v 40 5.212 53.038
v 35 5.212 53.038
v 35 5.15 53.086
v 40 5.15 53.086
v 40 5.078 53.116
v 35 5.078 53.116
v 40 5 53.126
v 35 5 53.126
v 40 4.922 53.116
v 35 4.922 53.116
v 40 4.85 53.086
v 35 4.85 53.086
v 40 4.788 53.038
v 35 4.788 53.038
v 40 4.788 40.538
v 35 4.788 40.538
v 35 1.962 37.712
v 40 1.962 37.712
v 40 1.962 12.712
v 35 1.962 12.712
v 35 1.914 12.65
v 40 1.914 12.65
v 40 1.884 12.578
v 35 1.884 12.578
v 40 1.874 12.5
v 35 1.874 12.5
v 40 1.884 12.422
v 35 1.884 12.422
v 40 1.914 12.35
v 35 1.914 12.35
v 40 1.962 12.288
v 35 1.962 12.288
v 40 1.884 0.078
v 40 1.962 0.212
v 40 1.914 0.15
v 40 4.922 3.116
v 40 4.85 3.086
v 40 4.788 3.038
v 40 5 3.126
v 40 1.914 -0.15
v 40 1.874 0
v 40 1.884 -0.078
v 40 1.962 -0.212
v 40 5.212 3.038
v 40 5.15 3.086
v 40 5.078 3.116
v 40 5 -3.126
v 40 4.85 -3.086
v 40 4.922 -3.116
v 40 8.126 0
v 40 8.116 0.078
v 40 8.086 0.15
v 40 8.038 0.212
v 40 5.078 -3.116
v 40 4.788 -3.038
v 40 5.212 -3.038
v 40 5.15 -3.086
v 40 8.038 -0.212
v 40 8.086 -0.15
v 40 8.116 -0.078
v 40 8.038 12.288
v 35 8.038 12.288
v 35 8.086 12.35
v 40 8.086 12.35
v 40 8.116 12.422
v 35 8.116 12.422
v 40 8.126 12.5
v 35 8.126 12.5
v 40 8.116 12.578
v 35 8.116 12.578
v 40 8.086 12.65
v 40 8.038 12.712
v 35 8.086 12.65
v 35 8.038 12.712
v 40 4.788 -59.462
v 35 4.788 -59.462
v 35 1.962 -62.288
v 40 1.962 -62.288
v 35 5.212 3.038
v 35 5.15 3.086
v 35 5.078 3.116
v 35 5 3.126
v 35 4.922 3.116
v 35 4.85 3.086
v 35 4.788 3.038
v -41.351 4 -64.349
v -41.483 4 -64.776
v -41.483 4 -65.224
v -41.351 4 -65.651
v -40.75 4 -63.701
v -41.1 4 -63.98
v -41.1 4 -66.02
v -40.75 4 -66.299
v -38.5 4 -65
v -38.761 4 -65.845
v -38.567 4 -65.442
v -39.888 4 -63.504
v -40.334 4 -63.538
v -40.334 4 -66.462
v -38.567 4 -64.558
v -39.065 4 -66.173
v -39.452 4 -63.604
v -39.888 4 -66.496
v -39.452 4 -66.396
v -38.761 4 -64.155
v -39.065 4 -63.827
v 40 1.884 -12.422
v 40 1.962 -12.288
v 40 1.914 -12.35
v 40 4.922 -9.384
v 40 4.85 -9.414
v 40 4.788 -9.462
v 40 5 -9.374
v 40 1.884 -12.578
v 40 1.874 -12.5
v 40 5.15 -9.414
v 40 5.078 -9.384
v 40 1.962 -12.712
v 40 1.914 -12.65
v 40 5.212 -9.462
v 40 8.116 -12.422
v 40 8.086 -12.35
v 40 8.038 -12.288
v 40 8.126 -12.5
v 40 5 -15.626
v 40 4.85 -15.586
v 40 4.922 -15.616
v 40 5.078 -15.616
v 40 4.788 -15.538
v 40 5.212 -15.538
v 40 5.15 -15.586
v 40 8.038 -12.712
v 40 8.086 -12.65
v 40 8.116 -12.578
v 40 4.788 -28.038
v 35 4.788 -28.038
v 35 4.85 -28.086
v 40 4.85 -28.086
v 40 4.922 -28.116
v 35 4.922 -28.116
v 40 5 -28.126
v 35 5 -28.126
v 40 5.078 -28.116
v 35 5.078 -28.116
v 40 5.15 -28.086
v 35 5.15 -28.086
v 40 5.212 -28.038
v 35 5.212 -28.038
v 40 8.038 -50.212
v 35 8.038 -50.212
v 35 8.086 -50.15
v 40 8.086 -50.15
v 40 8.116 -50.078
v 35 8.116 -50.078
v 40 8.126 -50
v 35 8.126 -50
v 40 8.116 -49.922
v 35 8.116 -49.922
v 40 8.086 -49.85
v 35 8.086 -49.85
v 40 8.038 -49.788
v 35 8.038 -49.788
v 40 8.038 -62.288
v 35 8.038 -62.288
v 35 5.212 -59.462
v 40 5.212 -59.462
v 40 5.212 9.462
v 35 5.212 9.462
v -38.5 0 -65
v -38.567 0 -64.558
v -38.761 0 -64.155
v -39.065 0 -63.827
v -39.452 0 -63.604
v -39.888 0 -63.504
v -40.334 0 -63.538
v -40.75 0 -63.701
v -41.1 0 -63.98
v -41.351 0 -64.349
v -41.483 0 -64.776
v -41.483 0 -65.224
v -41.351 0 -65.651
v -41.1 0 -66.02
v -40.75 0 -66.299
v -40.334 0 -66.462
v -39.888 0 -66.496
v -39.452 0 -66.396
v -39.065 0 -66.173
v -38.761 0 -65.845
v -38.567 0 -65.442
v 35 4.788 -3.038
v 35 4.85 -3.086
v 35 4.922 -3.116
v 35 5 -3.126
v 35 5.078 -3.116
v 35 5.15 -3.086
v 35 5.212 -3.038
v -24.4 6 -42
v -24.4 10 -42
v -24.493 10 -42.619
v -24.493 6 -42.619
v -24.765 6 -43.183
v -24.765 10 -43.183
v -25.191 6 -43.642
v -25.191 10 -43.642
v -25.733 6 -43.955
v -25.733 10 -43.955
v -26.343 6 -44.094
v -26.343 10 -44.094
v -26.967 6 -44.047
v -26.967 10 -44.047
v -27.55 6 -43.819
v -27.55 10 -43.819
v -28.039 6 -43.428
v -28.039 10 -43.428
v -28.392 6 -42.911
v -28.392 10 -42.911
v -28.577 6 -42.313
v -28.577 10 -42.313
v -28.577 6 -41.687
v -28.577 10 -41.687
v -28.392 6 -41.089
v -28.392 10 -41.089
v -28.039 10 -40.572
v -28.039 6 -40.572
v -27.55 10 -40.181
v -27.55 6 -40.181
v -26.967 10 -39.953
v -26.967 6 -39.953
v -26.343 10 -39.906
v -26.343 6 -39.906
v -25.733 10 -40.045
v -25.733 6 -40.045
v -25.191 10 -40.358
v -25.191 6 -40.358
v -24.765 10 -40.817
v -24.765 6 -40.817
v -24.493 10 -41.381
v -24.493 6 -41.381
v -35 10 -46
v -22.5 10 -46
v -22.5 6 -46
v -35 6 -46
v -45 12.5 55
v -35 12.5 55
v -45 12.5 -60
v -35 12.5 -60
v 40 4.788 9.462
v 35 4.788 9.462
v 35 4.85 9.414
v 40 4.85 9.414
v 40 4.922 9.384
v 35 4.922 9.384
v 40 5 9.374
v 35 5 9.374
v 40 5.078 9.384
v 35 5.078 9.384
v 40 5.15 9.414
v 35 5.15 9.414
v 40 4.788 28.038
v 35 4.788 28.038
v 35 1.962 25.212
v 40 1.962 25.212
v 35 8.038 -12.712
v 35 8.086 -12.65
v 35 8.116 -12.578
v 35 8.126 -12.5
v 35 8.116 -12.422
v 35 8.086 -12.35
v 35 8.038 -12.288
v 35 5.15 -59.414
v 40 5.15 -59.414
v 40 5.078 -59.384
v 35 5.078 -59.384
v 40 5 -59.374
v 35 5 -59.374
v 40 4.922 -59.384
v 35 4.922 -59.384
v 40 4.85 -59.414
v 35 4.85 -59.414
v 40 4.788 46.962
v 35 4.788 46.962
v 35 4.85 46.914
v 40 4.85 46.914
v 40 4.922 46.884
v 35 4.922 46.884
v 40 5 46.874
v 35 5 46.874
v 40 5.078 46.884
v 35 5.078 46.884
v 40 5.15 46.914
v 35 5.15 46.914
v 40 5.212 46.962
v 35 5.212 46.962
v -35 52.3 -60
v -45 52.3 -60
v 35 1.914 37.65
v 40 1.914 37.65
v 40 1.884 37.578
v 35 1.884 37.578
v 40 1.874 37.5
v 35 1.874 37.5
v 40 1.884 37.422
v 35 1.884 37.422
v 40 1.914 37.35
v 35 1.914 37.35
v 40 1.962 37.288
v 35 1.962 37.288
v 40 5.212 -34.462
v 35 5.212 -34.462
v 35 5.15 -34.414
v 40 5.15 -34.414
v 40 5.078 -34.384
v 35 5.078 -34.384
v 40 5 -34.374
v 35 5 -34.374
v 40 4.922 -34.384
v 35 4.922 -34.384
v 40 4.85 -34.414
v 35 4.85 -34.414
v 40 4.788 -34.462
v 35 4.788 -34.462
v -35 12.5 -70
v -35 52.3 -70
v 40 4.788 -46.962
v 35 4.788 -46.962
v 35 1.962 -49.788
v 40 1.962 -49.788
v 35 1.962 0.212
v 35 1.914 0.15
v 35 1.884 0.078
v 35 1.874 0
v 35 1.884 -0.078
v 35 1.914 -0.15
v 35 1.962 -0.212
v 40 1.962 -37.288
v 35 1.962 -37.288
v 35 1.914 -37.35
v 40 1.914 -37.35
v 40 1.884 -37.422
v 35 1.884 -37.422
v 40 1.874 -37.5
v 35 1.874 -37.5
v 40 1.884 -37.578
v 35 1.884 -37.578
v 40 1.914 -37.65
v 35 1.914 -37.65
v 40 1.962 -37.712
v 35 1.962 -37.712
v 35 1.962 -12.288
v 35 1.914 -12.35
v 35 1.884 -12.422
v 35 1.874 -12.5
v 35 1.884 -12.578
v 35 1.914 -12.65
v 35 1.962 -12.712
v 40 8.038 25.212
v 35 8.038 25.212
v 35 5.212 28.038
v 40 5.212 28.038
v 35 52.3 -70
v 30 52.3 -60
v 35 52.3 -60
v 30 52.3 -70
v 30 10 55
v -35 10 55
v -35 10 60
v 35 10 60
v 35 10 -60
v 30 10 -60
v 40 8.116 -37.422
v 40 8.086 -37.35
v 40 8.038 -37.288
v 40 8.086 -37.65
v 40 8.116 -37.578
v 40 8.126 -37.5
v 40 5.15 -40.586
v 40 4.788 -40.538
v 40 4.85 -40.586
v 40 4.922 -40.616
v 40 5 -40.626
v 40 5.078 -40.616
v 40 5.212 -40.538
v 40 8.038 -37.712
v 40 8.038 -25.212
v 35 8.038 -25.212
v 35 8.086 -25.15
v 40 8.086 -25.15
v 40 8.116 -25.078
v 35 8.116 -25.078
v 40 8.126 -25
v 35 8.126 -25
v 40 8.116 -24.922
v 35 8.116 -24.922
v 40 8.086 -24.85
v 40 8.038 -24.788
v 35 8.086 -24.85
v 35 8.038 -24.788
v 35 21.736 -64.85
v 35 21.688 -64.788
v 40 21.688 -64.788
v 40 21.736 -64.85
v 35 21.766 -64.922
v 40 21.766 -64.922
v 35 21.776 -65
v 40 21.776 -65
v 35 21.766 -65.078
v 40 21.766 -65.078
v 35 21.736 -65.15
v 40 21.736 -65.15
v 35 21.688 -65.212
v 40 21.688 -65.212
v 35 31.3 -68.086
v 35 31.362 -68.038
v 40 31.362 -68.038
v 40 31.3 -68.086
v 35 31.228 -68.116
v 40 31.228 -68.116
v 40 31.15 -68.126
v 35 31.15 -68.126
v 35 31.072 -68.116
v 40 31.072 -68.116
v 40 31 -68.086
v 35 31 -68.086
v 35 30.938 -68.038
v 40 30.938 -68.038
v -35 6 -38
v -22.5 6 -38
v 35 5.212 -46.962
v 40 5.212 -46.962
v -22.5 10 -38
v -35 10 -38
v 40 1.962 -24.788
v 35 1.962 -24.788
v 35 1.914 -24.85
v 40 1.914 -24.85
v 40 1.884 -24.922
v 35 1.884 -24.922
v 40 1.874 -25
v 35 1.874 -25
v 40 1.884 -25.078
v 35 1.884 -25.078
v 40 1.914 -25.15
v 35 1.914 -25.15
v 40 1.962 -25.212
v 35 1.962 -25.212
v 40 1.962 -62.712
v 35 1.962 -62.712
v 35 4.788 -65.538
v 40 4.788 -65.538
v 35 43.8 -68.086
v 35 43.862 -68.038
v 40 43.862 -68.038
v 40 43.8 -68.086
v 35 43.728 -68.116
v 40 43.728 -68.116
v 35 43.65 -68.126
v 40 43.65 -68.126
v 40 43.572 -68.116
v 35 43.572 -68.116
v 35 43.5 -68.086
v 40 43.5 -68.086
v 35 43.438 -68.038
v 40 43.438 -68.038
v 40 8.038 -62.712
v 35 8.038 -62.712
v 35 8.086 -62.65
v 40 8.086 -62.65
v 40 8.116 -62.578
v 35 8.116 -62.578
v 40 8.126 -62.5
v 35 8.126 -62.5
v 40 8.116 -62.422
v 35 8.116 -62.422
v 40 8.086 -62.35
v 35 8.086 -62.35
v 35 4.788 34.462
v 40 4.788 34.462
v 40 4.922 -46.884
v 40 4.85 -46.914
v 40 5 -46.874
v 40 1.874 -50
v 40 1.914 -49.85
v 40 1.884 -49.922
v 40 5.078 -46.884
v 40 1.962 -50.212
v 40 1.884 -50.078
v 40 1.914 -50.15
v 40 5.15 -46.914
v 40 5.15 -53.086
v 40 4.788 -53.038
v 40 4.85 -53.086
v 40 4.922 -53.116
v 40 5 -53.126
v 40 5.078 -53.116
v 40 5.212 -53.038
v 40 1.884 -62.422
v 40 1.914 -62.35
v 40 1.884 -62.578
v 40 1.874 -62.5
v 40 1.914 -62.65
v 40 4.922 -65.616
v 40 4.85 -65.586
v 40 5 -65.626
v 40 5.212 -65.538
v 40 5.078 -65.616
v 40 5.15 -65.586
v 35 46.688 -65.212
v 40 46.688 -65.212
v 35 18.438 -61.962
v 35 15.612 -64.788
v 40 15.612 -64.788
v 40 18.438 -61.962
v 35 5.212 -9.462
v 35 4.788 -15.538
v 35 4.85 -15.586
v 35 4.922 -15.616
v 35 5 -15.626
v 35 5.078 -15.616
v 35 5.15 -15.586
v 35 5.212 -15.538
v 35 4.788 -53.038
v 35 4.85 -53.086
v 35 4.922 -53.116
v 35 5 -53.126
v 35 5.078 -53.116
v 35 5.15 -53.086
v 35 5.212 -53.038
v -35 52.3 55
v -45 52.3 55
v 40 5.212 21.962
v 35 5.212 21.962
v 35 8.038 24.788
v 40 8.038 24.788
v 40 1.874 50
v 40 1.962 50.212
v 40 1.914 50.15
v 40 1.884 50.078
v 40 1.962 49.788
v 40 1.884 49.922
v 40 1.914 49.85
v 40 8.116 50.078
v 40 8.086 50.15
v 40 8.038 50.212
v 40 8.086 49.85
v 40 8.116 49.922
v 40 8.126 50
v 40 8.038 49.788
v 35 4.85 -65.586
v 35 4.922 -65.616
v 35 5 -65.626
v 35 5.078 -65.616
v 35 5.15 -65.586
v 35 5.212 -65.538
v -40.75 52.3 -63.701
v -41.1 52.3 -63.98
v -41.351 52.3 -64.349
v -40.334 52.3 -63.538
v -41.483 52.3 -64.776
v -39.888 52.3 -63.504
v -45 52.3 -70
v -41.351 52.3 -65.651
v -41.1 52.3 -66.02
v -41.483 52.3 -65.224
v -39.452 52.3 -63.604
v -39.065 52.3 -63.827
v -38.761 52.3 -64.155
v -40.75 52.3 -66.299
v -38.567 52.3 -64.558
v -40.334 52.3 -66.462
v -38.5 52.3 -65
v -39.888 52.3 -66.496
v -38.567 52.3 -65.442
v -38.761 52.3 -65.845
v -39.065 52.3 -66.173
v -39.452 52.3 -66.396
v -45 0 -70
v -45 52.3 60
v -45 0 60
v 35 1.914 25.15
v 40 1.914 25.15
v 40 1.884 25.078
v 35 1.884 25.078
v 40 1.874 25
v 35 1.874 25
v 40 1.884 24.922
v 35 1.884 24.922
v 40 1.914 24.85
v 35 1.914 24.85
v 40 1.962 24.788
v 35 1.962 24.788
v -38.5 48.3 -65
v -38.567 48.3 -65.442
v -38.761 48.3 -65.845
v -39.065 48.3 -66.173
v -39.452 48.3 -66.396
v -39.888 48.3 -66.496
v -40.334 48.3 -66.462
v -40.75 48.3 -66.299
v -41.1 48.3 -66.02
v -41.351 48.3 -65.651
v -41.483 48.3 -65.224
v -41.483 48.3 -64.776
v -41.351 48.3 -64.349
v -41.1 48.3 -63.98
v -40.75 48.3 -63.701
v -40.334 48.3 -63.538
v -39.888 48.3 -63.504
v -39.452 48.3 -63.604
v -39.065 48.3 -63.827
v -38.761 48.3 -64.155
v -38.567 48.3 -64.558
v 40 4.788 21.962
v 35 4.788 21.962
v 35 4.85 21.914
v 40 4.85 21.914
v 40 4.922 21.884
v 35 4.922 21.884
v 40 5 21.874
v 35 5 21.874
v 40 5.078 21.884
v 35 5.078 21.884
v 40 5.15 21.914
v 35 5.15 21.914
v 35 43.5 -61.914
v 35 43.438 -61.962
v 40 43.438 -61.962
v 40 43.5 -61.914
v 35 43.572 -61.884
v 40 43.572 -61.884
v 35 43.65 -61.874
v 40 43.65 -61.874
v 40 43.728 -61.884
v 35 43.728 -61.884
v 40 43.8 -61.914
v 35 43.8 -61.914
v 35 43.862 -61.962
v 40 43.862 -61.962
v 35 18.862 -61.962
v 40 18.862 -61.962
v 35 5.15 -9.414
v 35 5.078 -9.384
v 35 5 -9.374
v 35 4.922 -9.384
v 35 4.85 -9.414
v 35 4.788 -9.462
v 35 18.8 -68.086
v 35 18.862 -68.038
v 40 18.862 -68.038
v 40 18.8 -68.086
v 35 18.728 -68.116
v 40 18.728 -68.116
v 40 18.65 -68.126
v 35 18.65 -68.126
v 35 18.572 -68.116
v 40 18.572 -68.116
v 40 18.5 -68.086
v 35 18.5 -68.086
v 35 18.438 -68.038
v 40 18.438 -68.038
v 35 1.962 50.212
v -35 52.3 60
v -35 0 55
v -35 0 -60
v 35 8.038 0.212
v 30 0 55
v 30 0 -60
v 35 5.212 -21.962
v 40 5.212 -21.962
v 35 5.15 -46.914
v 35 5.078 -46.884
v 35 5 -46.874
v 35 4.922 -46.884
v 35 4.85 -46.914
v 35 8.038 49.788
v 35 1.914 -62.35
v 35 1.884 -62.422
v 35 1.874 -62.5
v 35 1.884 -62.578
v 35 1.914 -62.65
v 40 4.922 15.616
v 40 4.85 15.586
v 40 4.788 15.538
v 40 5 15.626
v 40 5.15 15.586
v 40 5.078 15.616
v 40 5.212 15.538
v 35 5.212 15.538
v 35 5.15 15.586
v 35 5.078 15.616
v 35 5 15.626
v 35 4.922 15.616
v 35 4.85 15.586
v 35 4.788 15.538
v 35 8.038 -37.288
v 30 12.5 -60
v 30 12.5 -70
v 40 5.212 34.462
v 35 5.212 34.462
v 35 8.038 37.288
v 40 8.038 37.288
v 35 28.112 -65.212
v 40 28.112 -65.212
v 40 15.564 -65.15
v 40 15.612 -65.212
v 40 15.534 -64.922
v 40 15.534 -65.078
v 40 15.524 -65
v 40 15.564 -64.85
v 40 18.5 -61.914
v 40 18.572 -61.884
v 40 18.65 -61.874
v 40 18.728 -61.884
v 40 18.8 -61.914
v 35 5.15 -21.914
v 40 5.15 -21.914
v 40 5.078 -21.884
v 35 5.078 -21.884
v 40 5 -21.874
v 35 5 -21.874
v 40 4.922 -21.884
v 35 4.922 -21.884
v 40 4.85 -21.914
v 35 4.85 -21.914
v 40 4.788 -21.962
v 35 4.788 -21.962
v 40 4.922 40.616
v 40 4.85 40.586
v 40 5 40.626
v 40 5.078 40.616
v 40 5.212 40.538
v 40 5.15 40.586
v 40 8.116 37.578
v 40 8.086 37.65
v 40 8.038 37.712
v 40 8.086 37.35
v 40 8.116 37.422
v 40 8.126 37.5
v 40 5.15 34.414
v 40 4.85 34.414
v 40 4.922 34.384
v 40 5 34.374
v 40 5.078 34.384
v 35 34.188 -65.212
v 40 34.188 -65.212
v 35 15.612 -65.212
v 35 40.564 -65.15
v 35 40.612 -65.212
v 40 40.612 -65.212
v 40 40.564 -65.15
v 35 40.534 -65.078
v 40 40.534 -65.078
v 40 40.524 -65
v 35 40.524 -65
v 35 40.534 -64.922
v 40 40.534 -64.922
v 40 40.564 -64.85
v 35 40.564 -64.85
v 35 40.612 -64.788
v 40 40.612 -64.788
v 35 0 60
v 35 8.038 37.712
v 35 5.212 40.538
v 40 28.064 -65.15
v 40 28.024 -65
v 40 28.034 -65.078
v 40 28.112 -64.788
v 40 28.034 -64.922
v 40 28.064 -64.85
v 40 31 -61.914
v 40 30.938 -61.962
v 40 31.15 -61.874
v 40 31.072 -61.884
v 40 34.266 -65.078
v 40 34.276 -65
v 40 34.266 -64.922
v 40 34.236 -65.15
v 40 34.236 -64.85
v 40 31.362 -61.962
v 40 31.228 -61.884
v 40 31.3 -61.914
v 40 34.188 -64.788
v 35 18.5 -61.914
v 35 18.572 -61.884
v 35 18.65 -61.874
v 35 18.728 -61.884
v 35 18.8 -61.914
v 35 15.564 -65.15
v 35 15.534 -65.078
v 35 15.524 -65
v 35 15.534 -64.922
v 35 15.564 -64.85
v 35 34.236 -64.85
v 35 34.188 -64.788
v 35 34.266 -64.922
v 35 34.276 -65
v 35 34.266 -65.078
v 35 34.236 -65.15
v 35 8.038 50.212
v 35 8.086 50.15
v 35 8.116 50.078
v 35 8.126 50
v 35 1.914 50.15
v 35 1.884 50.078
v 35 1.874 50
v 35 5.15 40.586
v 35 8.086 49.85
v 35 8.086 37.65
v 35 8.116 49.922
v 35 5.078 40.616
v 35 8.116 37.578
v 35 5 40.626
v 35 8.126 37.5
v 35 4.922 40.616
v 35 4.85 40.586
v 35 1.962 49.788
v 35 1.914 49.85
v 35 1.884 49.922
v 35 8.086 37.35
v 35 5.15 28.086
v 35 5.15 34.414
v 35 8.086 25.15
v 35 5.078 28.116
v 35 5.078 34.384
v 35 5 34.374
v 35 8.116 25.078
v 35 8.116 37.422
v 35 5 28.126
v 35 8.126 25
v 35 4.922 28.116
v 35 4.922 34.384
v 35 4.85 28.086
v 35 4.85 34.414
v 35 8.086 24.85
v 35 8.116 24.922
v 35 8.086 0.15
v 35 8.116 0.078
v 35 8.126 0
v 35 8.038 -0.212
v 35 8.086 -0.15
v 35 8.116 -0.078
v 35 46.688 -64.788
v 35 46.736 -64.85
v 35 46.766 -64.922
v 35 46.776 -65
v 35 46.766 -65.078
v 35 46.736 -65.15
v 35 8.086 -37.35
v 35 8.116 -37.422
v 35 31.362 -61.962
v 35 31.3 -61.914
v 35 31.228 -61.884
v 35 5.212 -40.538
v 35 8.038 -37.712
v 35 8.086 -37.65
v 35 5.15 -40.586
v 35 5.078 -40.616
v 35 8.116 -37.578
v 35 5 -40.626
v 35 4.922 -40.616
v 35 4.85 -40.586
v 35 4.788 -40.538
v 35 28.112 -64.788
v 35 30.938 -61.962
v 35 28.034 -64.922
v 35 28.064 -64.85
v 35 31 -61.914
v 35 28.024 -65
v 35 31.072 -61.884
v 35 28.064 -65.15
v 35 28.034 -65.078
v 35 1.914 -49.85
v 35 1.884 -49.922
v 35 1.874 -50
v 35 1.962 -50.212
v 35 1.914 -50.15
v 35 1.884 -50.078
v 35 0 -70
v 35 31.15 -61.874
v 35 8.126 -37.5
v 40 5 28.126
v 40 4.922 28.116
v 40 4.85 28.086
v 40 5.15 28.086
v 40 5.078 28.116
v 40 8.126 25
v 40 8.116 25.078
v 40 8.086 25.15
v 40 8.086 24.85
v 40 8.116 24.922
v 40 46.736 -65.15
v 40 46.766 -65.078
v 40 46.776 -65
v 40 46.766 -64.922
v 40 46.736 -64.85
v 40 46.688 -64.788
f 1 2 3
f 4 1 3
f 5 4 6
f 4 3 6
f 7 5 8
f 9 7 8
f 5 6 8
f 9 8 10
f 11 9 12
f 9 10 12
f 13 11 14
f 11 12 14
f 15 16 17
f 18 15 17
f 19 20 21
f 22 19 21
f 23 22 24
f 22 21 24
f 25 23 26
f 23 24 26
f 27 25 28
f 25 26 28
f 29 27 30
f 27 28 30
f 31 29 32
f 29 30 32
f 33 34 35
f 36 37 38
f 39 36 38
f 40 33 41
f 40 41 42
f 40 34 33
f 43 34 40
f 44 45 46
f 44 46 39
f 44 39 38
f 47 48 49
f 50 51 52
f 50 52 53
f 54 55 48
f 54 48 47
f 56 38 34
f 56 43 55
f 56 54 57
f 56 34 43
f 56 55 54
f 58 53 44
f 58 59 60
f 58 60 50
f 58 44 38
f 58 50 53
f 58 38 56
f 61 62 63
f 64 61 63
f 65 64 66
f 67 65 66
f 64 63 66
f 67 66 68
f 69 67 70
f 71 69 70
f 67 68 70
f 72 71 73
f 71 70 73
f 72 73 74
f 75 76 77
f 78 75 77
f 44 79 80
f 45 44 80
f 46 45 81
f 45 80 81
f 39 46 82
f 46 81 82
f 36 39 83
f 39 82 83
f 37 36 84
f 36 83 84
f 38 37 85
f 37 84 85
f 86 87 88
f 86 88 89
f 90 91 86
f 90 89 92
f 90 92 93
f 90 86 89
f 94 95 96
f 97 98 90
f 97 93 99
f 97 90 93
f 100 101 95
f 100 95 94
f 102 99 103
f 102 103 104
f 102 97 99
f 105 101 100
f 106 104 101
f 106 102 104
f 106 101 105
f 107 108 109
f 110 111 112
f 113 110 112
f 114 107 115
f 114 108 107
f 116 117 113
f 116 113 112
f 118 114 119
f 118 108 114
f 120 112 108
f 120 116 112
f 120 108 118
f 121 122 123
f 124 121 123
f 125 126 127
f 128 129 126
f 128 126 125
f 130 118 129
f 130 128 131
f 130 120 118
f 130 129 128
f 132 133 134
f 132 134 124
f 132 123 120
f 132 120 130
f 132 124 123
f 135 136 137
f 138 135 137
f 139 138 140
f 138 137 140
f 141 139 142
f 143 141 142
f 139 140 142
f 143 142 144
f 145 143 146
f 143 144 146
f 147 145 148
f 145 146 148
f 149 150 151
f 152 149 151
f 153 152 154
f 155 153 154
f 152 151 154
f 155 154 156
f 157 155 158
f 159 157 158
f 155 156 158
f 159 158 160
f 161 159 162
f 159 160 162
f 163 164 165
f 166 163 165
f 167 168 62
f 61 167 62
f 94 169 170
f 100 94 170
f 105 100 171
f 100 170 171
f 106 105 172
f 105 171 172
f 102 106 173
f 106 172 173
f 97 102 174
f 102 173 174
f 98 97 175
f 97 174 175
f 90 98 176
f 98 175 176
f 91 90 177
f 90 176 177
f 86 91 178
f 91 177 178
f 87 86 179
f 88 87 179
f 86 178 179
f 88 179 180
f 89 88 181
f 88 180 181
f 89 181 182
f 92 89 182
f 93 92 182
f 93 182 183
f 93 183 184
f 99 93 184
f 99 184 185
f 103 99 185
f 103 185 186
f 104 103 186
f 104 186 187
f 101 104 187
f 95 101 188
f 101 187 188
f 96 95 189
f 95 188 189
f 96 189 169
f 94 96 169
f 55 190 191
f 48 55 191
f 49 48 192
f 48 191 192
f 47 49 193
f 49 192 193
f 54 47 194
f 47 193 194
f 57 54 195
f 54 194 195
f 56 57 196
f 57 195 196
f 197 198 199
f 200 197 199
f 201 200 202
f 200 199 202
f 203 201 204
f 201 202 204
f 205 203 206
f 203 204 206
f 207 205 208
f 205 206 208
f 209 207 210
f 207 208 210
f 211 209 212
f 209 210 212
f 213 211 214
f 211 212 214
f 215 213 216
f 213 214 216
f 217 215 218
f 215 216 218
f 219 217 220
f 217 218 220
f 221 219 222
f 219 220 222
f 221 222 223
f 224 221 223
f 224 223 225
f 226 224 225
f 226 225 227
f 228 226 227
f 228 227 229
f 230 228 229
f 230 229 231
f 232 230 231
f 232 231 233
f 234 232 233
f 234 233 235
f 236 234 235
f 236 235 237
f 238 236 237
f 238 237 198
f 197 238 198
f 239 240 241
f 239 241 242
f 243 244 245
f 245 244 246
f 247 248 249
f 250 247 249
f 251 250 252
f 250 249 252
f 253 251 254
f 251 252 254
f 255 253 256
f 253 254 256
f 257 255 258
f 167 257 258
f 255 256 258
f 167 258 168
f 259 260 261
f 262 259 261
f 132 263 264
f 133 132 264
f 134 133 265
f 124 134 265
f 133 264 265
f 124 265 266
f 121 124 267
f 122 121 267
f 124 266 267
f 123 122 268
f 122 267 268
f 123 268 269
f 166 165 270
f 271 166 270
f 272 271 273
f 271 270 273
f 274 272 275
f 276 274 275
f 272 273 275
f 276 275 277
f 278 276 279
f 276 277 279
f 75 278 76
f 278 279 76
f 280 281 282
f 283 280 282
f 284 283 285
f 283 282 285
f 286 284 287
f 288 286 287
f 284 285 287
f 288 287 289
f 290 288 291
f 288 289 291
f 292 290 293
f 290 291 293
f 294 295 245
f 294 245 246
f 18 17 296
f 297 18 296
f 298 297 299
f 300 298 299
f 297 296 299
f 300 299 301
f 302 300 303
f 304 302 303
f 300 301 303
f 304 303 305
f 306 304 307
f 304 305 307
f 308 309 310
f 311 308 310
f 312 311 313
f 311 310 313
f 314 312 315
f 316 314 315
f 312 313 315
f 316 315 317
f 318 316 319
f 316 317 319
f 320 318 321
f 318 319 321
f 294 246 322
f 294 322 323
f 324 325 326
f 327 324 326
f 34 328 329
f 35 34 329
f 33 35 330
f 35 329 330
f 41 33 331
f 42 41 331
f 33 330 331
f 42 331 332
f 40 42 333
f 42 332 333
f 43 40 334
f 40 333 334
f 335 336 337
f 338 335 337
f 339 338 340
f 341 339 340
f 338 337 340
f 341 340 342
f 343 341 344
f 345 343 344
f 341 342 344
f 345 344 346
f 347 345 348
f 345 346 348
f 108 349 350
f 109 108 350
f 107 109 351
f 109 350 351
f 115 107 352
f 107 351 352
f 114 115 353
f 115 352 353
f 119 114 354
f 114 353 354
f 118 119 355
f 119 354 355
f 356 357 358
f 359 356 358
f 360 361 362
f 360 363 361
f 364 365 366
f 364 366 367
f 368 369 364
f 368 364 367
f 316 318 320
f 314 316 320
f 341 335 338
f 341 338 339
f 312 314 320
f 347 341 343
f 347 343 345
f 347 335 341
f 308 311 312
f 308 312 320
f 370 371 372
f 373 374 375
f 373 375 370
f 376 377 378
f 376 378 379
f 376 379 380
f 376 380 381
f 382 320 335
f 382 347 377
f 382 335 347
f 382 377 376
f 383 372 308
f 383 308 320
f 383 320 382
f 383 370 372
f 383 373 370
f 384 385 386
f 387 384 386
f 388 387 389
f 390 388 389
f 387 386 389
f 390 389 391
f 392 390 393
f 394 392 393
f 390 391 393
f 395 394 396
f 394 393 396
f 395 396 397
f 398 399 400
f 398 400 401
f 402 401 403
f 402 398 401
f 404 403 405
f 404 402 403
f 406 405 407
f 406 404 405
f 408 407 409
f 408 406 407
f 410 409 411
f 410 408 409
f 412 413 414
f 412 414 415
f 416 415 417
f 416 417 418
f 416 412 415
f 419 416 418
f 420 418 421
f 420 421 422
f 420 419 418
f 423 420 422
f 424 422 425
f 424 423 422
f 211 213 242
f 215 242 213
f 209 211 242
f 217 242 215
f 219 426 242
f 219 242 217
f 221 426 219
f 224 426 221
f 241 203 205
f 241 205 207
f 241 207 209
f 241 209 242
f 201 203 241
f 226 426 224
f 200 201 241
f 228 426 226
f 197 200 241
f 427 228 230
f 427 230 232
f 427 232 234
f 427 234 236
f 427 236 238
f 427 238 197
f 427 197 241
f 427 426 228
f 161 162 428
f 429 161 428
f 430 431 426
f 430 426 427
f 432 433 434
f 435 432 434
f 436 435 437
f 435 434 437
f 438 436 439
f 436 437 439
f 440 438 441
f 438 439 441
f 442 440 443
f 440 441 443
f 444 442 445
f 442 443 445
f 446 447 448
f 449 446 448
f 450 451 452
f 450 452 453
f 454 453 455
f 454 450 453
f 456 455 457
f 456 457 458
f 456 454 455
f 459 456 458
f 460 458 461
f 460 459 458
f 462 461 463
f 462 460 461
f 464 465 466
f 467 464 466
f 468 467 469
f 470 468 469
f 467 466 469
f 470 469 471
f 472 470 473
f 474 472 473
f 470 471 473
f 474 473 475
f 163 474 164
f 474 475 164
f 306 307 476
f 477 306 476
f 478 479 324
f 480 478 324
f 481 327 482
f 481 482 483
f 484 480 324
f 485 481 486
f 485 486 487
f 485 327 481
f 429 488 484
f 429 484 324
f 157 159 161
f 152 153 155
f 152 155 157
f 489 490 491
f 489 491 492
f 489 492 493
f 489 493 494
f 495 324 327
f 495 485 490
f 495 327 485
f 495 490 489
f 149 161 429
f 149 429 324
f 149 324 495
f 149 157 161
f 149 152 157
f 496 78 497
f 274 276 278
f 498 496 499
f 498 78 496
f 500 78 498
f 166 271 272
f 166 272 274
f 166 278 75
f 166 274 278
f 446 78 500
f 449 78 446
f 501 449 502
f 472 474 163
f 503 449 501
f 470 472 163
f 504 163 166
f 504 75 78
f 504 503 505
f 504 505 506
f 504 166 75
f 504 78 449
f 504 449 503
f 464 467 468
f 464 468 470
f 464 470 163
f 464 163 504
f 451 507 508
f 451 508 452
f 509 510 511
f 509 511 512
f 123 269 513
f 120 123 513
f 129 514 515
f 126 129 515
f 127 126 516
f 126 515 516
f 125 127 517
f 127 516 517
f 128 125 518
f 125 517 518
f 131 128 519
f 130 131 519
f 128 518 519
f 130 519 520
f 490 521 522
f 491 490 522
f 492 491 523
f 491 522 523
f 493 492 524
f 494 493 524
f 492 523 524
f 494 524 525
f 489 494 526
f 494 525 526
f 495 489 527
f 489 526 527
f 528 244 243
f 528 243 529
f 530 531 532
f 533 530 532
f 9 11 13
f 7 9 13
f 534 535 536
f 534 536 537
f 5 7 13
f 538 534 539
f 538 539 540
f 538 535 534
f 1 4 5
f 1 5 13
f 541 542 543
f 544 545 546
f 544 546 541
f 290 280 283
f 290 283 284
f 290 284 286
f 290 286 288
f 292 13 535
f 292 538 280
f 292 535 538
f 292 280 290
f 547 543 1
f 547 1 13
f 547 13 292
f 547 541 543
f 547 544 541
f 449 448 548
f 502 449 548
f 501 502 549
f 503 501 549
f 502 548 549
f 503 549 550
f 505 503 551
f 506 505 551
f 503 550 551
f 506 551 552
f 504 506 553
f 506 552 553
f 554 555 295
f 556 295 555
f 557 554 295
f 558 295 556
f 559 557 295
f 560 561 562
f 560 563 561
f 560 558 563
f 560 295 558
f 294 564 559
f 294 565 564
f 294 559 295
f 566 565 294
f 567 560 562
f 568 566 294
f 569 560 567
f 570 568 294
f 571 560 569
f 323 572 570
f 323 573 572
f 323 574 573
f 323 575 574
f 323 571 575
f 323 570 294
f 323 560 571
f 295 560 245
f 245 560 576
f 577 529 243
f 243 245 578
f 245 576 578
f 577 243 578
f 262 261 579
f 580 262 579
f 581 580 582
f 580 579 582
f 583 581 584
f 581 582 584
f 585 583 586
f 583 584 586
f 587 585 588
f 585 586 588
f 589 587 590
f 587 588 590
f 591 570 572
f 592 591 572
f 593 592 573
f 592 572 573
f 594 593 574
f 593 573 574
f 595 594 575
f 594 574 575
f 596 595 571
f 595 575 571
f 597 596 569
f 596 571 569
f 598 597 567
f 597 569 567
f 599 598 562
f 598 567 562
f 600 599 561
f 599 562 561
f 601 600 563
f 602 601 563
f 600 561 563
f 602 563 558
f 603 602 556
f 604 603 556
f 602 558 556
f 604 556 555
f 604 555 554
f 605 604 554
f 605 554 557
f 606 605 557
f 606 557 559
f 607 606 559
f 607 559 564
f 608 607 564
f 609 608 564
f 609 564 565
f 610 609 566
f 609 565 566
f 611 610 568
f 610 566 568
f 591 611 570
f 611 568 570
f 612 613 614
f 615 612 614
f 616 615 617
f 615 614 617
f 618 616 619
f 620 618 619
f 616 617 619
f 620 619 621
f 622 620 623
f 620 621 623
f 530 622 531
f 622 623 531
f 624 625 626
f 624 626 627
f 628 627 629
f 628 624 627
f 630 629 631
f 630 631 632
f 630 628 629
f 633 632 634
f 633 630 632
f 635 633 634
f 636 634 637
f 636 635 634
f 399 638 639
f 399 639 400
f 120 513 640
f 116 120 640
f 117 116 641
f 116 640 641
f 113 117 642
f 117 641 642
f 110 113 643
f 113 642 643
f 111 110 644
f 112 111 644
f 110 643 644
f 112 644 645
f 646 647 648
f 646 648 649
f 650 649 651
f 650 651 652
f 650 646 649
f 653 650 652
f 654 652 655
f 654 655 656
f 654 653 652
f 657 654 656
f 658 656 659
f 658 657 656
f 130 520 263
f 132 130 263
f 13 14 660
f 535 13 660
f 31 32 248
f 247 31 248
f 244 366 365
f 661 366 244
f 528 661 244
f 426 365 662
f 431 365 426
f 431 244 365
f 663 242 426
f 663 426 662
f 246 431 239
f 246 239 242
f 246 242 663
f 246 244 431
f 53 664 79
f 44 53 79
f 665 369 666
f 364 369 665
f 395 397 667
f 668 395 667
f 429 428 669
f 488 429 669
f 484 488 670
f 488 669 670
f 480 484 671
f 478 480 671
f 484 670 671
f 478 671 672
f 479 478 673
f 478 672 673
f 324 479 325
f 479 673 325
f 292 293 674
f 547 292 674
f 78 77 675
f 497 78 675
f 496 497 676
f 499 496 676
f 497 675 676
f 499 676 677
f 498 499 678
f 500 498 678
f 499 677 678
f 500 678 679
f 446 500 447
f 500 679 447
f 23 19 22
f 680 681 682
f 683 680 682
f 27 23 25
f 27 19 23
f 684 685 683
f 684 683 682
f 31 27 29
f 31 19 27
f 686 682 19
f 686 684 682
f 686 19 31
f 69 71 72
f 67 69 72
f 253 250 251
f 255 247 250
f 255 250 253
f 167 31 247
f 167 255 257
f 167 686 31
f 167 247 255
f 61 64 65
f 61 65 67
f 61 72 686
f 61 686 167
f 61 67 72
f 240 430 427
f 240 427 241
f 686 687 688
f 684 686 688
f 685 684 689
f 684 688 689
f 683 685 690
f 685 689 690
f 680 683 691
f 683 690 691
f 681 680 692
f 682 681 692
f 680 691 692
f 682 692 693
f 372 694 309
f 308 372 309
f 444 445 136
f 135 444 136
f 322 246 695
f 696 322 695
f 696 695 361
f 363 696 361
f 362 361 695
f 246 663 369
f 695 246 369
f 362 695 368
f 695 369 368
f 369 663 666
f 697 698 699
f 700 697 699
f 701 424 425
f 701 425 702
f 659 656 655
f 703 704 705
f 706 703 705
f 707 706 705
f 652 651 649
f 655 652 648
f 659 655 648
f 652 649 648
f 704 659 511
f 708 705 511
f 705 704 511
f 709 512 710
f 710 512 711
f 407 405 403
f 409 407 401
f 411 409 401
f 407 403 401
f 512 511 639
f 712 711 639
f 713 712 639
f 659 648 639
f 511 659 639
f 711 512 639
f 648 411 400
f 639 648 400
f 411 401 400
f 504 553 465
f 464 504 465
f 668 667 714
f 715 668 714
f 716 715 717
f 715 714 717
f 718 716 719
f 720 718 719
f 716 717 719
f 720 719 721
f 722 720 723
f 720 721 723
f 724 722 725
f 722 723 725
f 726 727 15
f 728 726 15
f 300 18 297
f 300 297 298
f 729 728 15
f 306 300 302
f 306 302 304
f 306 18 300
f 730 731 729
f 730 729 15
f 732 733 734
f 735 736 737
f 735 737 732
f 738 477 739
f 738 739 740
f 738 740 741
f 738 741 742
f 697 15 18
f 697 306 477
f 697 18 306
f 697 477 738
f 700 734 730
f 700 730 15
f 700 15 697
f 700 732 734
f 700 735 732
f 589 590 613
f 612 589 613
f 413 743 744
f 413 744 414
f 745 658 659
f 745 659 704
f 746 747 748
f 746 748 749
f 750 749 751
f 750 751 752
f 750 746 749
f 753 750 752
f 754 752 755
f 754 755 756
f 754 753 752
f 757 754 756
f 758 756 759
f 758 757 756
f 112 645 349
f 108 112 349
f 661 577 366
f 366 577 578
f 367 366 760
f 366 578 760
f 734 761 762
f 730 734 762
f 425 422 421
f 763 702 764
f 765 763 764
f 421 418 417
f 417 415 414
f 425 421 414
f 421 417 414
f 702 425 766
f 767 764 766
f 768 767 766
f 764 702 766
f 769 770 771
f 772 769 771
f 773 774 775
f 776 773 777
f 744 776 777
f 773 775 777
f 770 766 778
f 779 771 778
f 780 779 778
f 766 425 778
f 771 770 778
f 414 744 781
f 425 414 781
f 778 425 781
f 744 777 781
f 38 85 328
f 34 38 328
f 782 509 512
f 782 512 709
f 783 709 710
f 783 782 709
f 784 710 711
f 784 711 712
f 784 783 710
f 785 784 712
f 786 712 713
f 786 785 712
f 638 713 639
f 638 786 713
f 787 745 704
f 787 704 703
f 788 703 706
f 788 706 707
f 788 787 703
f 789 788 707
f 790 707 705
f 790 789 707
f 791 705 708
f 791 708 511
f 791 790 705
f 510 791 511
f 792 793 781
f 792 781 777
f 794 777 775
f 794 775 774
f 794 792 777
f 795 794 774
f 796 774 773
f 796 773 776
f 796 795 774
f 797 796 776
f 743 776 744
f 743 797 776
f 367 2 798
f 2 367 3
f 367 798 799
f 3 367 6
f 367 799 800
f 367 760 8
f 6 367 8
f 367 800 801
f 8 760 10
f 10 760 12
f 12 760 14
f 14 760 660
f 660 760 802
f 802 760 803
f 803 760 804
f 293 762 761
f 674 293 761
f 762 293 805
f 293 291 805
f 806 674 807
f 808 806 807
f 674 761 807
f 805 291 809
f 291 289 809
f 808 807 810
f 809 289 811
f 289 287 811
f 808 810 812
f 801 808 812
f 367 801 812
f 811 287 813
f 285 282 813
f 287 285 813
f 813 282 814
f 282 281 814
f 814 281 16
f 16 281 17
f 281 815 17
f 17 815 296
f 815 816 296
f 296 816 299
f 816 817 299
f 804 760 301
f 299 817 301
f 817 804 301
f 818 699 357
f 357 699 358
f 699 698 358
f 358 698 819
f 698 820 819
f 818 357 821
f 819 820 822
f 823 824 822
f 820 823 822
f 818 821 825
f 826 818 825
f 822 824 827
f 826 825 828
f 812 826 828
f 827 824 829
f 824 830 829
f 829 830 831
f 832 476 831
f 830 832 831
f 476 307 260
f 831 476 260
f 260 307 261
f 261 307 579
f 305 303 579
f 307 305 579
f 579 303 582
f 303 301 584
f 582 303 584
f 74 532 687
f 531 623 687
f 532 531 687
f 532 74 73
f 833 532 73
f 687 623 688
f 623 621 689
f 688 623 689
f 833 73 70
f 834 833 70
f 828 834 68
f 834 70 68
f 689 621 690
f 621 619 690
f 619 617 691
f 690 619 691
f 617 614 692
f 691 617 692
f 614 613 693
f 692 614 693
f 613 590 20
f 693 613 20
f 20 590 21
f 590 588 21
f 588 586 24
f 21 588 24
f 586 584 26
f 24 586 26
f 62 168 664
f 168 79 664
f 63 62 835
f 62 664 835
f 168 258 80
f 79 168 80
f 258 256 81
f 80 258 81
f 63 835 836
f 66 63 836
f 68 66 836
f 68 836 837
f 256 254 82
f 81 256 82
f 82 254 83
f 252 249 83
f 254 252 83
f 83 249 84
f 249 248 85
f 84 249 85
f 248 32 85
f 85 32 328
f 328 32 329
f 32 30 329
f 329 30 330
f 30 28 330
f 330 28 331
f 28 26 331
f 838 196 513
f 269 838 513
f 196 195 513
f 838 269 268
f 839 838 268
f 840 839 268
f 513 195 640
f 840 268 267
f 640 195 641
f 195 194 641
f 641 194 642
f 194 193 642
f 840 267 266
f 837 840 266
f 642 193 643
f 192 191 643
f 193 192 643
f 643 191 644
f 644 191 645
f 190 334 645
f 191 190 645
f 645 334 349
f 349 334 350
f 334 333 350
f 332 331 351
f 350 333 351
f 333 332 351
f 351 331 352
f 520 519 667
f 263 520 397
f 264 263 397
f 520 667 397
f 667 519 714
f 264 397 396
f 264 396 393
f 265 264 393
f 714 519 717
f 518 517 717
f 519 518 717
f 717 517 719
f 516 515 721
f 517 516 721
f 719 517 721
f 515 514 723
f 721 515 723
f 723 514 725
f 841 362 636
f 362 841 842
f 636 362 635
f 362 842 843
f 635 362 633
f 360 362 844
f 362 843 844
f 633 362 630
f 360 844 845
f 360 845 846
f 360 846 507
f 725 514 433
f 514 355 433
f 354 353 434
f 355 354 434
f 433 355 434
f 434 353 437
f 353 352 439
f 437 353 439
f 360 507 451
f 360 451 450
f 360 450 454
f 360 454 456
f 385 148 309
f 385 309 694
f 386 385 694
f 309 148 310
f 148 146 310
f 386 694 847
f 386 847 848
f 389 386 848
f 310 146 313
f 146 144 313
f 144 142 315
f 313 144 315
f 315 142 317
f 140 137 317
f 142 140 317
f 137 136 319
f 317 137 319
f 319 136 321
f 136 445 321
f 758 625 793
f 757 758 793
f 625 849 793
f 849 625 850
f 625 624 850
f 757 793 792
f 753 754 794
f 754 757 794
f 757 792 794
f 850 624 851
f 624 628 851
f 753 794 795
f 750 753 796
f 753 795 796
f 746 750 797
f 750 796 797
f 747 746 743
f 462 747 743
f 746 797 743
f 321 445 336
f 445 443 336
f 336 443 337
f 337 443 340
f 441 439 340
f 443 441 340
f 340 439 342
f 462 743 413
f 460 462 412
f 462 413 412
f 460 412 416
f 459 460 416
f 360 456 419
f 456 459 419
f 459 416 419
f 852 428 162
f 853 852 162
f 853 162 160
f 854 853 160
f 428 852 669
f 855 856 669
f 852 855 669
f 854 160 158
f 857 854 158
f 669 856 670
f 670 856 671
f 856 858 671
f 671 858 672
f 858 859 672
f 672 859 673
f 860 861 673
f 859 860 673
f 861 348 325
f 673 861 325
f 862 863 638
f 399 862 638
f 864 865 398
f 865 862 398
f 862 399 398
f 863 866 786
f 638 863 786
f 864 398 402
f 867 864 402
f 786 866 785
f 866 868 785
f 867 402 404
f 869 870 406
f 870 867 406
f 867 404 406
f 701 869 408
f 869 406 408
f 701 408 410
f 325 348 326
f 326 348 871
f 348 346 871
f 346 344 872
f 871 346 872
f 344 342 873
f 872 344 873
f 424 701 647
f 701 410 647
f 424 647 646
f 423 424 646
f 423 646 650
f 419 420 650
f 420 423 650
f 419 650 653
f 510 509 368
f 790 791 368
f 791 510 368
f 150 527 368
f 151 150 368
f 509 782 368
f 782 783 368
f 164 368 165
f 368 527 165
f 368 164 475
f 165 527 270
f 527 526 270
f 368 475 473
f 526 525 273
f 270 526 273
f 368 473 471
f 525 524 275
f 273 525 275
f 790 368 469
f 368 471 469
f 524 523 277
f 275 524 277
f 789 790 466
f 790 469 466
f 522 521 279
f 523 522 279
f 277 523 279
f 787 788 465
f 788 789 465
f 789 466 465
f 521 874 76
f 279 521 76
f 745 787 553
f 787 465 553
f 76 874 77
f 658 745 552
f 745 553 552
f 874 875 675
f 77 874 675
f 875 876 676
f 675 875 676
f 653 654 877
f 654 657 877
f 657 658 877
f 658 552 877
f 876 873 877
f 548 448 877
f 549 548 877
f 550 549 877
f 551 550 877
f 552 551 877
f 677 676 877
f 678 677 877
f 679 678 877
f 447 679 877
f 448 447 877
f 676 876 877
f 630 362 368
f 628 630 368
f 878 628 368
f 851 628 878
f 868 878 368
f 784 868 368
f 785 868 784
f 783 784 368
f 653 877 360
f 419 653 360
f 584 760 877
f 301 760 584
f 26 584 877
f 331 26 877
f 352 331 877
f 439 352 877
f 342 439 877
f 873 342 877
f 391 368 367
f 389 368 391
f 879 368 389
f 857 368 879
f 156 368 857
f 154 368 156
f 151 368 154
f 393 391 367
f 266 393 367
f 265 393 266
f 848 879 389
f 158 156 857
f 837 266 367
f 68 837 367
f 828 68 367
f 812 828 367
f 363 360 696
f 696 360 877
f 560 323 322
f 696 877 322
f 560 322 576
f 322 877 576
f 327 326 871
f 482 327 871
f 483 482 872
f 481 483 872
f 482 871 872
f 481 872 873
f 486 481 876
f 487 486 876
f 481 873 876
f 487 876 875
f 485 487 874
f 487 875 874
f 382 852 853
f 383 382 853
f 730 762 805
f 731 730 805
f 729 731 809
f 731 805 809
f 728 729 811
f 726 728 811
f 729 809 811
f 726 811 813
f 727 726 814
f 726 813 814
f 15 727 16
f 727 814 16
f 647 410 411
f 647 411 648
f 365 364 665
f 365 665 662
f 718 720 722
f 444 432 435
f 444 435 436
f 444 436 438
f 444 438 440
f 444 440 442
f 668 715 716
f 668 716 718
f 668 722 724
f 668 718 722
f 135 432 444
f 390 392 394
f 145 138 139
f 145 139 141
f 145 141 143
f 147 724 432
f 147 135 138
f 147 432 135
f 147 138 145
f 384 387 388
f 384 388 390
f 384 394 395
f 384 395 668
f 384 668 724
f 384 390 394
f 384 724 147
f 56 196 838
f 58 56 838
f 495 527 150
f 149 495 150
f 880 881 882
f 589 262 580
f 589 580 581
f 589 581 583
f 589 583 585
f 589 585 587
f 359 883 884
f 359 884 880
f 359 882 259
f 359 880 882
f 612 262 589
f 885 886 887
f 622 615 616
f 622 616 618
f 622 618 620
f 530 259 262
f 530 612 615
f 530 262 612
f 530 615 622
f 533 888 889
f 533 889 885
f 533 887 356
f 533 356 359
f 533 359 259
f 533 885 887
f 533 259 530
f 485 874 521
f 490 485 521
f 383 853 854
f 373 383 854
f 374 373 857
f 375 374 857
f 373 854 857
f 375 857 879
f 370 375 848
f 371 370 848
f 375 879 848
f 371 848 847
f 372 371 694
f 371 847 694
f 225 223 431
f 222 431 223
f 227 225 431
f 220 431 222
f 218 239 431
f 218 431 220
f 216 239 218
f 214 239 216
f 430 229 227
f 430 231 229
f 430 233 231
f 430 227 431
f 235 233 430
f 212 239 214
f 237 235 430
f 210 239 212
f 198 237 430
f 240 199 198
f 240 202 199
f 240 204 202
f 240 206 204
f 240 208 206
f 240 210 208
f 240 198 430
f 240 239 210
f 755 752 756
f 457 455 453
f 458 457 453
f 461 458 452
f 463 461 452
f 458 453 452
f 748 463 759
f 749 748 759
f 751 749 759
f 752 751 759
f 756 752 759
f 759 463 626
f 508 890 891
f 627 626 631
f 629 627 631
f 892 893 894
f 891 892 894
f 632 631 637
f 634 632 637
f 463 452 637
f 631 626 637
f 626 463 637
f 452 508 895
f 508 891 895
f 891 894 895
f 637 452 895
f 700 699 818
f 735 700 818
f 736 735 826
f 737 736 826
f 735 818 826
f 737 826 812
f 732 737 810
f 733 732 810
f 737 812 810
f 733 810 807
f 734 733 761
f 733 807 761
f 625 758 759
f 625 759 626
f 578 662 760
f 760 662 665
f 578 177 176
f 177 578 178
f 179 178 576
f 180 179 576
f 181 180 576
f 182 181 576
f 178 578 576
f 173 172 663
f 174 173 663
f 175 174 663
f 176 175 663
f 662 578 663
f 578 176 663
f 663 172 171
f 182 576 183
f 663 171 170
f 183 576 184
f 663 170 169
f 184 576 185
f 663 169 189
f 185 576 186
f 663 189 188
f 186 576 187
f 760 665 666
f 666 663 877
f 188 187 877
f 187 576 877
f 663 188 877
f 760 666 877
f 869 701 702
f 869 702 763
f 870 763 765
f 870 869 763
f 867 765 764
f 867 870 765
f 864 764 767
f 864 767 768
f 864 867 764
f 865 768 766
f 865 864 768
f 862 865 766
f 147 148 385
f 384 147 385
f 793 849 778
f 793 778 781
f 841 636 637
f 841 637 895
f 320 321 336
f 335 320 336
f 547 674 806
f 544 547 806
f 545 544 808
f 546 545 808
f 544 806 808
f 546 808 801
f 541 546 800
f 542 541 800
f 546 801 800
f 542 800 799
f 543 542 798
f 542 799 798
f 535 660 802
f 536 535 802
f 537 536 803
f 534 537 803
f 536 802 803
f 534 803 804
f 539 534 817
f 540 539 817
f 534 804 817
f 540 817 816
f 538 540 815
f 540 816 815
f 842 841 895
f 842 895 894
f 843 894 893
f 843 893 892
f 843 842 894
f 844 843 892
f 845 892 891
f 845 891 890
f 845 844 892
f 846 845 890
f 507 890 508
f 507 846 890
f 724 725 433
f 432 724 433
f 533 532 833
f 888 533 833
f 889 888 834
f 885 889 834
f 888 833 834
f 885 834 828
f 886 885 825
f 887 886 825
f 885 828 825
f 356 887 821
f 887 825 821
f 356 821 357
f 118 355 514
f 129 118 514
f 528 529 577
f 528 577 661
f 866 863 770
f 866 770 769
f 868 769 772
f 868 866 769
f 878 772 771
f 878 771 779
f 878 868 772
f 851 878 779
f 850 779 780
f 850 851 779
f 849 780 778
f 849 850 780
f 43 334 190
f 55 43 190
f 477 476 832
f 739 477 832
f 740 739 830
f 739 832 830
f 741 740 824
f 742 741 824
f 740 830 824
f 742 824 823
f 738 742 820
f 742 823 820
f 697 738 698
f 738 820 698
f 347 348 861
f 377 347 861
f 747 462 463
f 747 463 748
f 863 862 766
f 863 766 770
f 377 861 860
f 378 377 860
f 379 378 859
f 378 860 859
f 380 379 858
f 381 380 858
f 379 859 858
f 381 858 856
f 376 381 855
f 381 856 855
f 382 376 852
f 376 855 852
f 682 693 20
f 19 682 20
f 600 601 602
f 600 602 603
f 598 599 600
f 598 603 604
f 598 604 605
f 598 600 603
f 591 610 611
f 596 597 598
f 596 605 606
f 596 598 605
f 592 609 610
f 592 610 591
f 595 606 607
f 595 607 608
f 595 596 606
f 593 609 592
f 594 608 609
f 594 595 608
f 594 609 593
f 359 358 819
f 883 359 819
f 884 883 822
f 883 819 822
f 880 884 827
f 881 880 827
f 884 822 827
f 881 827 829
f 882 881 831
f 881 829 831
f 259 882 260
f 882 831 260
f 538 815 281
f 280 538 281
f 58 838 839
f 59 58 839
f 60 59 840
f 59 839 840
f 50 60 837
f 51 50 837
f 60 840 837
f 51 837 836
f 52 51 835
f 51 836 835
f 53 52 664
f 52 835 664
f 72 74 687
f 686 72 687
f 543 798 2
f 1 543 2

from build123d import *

# Parameters (mm, degrees)
SKETCH1_W            = 80
SKETCH1_H            = 130
BOSS_EXTRUDE1_DEPTH  = 10
BOSS_EXTRUDE10_DEPTH = 42.3
SKETCH13_W           = 115
SKETCH13_H           = 39.8
CUT_EXTRUDE3_DEPTH   = 11
SKETCH14_W           = 65
SKETCH14_H           = 39.8
CUT_EXTRUDE4_DEPTH   = 11
SKETCH15_R           = 1.5
CUT_EXTRUDE5_DEPTH   = 4
SKETCH21_R           = 2.1
CUT_EXTRUDE8_DEPTH   = 11
BOSS_EXTRUDE11_DEPTH = 5
CUT_EXTRUDE9_DEPTH   = 11
SKETCH24_R           = 1.5
CUT_EXTRUDE10_DEPTH  = 4
SKETCH25_W           = 12.5
SKETCH25_H           = 8
CUT_EXTRUDE11_DEPTH  = 6


with BuildPart() as part:
    # Sketch1 → Boss-Extrude1 (new body)
    with BuildSketch(Plane(origin=(0, 0, 0), x_dir=(1, 0, 0), z_dir=(0, 1, 0))):
        with Locations((-5, 5)):
            Rectangle(SKETCH1_W, SKETCH1_H)
    extrude(amount=BOSS_EXTRUDE1_DEPTH)

    # Sketch9 → Boss-Extrude10 (add)
    with BuildSketch(Plane(origin=(0, 10, 0), x_dir=(1, 0, 0), z_dir=(0, 1, 0))):
        Polygon((35, 70), (-45, 70), (-45, -60), (-35, -60), (-35, 60), (35, 60), align=None)
    extrude(amount=BOSS_EXTRUDE10_DEPTH)

    # Sketch13 → Cut-Extrude3 (cut, through all)
    with BuildSketch(Plane(origin=(-35, 0, 0), x_dir=(0, 0, -1), z_dir=(1, 0, 0))):
        with Locations((2.5, 32.4)):
            Rectangle(SKETCH13_W, SKETCH13_H)
    extrude(amount=-CUT_EXTRUDE3_DEPTH, mode=Mode.SUBTRACT)

    # Sketch14 → Cut-Extrude4 (cut, through all)
    with BuildSketch(Plane.XY.offset(-60)):
        with Locations((-2.5, 32.4)):
            Rectangle(SKETCH14_W, SKETCH14_H)
    extrude(amount=-CUT_EXTRUDE4_DEPTH, mode=Mode.SUBTRACT)

    # Sketch15 → Cut-Extrude5 (cut)
    with BuildSketch(Plane(origin=(0, 52.3, 0), x_dir=(1, 0, 0), z_dir=(0, 1, 0))):
        with Locations((-40, 65)):
            Circle(SKETCH15_R)
    extrude(amount=-CUT_EXTRUDE5_DEPTH, mode=Mode.SUBTRACT)

    # Sketch21 → Cut-Extrude8 (cut, through all)
    with BuildSketch(Plane(origin=(0, 10, 0), x_dir=(1, 0, 0), z_dir=(0, 1, 0))):
        with Locations((-26.5, 42)):
            Circle(SKETCH21_R)
    extrude(amount=-CUT_EXTRUDE8_DEPTH, mode=Mode.SUBTRACT)

    # Sketch22 → Boss-Extrude11 (add)
    with BuildSketch(Plane(origin=(35, 0, 0), x_dir=(0, 0, -1), z_dir=(1, 0, 0))):
        with BuildLine():
            Line((-0.212132034, 8.037867966), (-3.037867966, 5.212132034))
            ThreePointArc((-3.037867966, 5.212132034), (-3.125735931, 5), (-3.037867966, 4.787867966))
            Line((-3.037867966, 4.787867966), (-0.212132034, 1.962132034))
            ThreePointArc((-0.212132034, 1.962132034), (0, 1.874264069), (0.212132034, 1.962132034))
            Line((0.212132034, 1.962132034), (3.037867966, 4.787867966))
            ThreePointArc((3.037867966, 4.787867966), (3.125735931, 5), (3.037867966, 5.212132034))
            Line((3.037867966, 5.212132034), (0.212132034, 8.037867966))
            ThreePointArc((0.212132034, 8.037867966), (0, 8.125735931), (-0.212132034, 8.037867966))
        make_face()
        with BuildLine():
            Line((15.537867966, 5.212132034), (12.712132034, 8.037867966))
            ThreePointArc((12.712132034, 8.037867966), (12.5, 8.125735931), (12.287867966, 8.037867966))
            Line((12.287867966, 8.037867966), (9.462132034, 5.212132034))
            ThreePointArc((9.462132034, 5.212132034), (9.374264069, 5), (9.462132034, 4.787867966))
            Line((9.462132034, 4.787867966), (12.287867966, 1.962132034))
            ThreePointArc((12.287867966, 1.962132034), (12.5, 1.874264069), (12.712132034, 1.962132034))
            Line((12.712132034, 1.962132034), (15.537867966, 4.787867966))
            ThreePointArc((15.537867966, 4.787867966), (15.625735931, 5), (15.537867966, 5.212132034))
        make_face()
        with BuildLine():
            Line((28.037867966, 5.212132034), (25.212132034, 8.037867966))
            ThreePointArc((25.212132034, 8.037867966), (25, 8.125735931), (24.787867966, 8.037867966))
            Line((24.787867966, 8.037867966), (21.962132034, 5.212132034))
            ThreePointArc((21.962132034, 5.212132034), (21.874264069, 5), (21.962132034, 4.787867966))
            Line((21.962132034, 4.787867966), (24.787867966, 1.962132034))
            ThreePointArc((24.787867966, 1.962132034), (25, 1.874264069), (25.212132034, 1.962132034))
            Line((25.212132034, 1.962132034), (28.037867966, 4.787867966))
            ThreePointArc((28.037867966, 4.787867966), (28.125735931, 5), (28.037867966, 5.212132034))
        make_face()
        with BuildLine():
            Line((40.537867966, 5.212132034), (37.712132034, 8.037867966))
            ThreePointArc((37.712132034, 8.037867966), (37.5, 8.125735931), (37.287867966, 8.037867966))
            Line((37.287867966, 8.037867966), (34.462132034, 5.212132034))
            ThreePointArc((34.462132034, 5.212132034), (34.374264069, 5), (34.462132034, 4.787867966))
            Line((34.462132034, 4.787867966), (37.287867966, 1.962132034))
            ThreePointArc((37.287867966, 1.962132034), (37.5, 1.874264069), (37.712132034, 1.962132034))
            Line((37.712132034, 1.962132034), (40.537867966, 4.787867966))
            ThreePointArc((40.537867966, 4.787867966), (40.625735931, 5), (40.537867966, 5.212132034))
        make_face()
        with BuildLine():
            Line((53.037867966, 5.212132034), (50.212132034, 8.037867966))
            ThreePointArc((50.212132034, 8.037867966), (50, 8.125735931), (49.787867966, 8.037867966))
            Line((49.787867966, 8.037867966), (46.962132034, 5.212132034))
            ThreePointArc((46.962132034, 5.212132034), (46.874264069, 5), (46.962132034, 4.787867966))
            Line((46.962132034, 4.787867966), (49.787867966, 1.962132034))
            ThreePointArc((49.787867966, 1.962132034), (50, 1.874264069), (50.212132034, 1.962132034))
            Line((50.212132034, 1.962132034), (53.037867966, 4.787867966))
            ThreePointArc((53.037867966, 4.787867966), (53.125735931, 5), (53.037867966, 5.212132034))
        make_face()
        with BuildLine():
            Line((65.537867966, 5.212132034), (62.712132034, 8.037867966))
            ThreePointArc((62.712132034, 8.037867966), (62.5, 8.125735931), (62.287867966, 8.037867966))
            Line((62.287867966, 8.037867966), (59.462132034, 5.212132034))
            ThreePointArc((59.462132034, 5.212132034), (59.374264069, 5), (59.462132034, 4.787867966))
            Line((59.462132034, 4.787867966), (62.287867966, 1.962132034))
            ThreePointArc((62.287867966, 1.962132034), (62.5, 1.874264069), (62.712132034, 1.962132034))
            Line((62.712132034, 1.962132034), (65.537867966, 4.787867966))
            ThreePointArc((65.537867966, 4.787867966), (65.625735931, 5), (65.537867966, 5.212132034))
        make_face()
        with BuildLine():
            Line((-9.462132034, 5.212132034), (-12.287867966, 8.037867966))
            ThreePointArc((-12.287867966, 8.037867966), (-12.5, 8.125735931), (-12.712132034, 8.037867966))
            Line((-12.712132034, 8.037867966), (-15.537867966, 5.212132034))
            ThreePointArc((-15.537867966, 5.212132034), (-15.625735931, 5), (-15.537867966, 4.787867966))
            Line((-15.537867966, 4.787867966), (-12.712132034, 1.962132034))
            ThreePointArc((-12.712132034, 1.962132034), (-12.5, 1.874264069), (-12.287867966, 1.962132034))
            Line((-12.287867966, 1.962132034), (-9.462132034, 4.787867966))
            ThreePointArc((-9.462132034, 4.787867966), (-9.374264069, 5), (-9.462132034, 5.212132034))
        make_face()
        with BuildLine():
            Line((-21.962132034, 5.212132034), (-24.787867966, 8.037867966))
            ThreePointArc((-24.787867966, 8.037867966), (-25, 8.125735931), (-25.212132034, 8.037867966))
            Line((-25.212132034, 8.037867966), (-28.037867966, 5.212132034))
            ThreePointArc((-28.037867966, 5.212132034), (-28.125735931, 5), (-28.037867966, 4.787867966))
            Line((-28.037867966, 4.787867966), (-25.212132034, 1.962132034))
            ThreePointArc((-25.212132034, 1.962132034), (-25, 1.874264069), (-24.787867966, 1.962132034))
            Line((-24.787867966, 1.962132034), (-21.962132034, 4.787867966))
            ThreePointArc((-21.962132034, 4.787867966), (-21.874264069, 5), (-21.962132034, 5.212132034))
        make_face()
        with BuildLine():
            Line((-34.462132034, 5.212132034), (-37.287867966, 8.037867966))
            ThreePointArc((-37.287867966, 8.037867966), (-37.5, 8.125735931), (-37.712132034, 8.037867966))
            Line((-37.712132034, 8.037867966), (-40.537867966, 5.212132034))
            ThreePointArc((-40.537867966, 5.212132034), (-40.625735931, 5), (-40.537867966, 4.787867966))
            Line((-40.537867966, 4.787867966), (-37.712132034, 1.962132034))
            ThreePointArc((-37.712132034, 1.962132034), (-37.5, 1.874264069), (-37.287867966, 1.962132034))
            Line((-37.287867966, 1.962132034), (-34.462132034, 4.787867966))
            ThreePointArc((-34.462132034, 4.787867966), (-34.374264069, 5), (-34.462132034, 5.212132034))
        make_face()
        with BuildLine():
            Line((-46.962132034, 5.212132034), (-49.787867966, 8.037867966))
            ThreePointArc((-49.787867966, 8.037867966), (-50, 8.125735931), (-50.212132034, 8.037867966))
            Line((-50.212132034, 8.037867966), (-53.037867966, 5.212132034))
            ThreePointArc((-53.037867966, 5.212132034), (-53.125735931, 5), (-53.037867966, 4.787867966))
            Line((-53.037867966, 4.787867966), (-50.212132034, 1.962132034))
            ThreePointArc((-50.212132034, 1.962132034), (-50, 1.874264069), (-49.787867966, 1.962132034))
            Line((-49.787867966, 1.962132034), (-46.962132034, 4.787867966))
            ThreePointArc((-46.962132034, 4.787867966), (-46.874264069, 5), (-46.962132034, 5.212132034))
        make_face()
        with BuildLine():
            Line((61.962132034, 31.362132034), (64.787867966, 34.187867966))
            ThreePointArc((64.787867966, 34.187867966), (65, 34.275735931), (65.212132034, 34.187867966))
            Line((65.212132034, 34.187867966), (68.037867966, 31.362132034))
            ThreePointArc((68.037867966, 31.362132034), (68.125735931, 31.15), (68.037867966, 30.937867966))
            Line((68.037867966, 30.937867966), (65.212132034, 28.112132034))
            ThreePointArc((65.212132034, 28.112132034), (65, 28.024264069), (64.787867966, 28.112132034))
            Line((64.787867966, 28.112132034), (61.962132034, 30.937867966))
            ThreePointArc((61.962132034, 30.937867966), (61.874264069, 31.15), (61.962132034, 31.362132034))
        make_face()
        with BuildLine():
            Line((64.787867966, 40.612132034), (61.962132034, 43.437867966))
            ThreePointArc((61.962132034, 43.437867966), (61.874264069, 43.65), (61.962132034, 43.862132034))
            Line((61.962132034, 43.862132034), (64.787867966, 46.687867966))
            ThreePointArc((64.787867966, 46.687867966), (65, 46.775735931), (65.212132034, 46.687867966))
            Line((65.212132034, 46.687867966), (68.037867966, 43.862132034))
            ThreePointArc((68.037867966, 43.862132034), (68.125735931, 43.65), (68.037867966, 43.437867966))
            Line((68.037867966, 43.437867966), (65.212132034, 40.612132034))
            ThreePointArc((65.212132034, 40.612132034), (65, 40.524264069), (64.787867966, 40.612132034))
        make_face()
        with BuildLine():
            Line((64.787867966, 15.612132034), (61.962132034, 18.437867966))
            ThreePointArc((61.962132034, 18.437867966), (61.874264069, 18.65), (61.962132034, 18.862132034))
            Line((61.962132034, 18.862132034), (64.787867966, 21.687867966))
            ThreePointArc((64.787867966, 21.687867966), (65, 21.775735931), (65.212132034, 21.687867966))
            Line((65.212132034, 21.687867966), (68.037867966, 18.862132034))
            ThreePointArc((68.037867966, 18.862132034), (68.125735931, 18.65), (68.037867966, 18.437867966))
            Line((68.037867966, 18.437867966), (65.212132034, 15.612132034))
            ThreePointArc((65.212132034, 15.612132034), (65, 15.524264069), (64.787867966, 15.612132034))
        make_face()
    extrude(amount=BOSS_EXTRUDE11_DEPTH)

    # Sketch23 → Cut-Extrude9 (cut, through all)
    with BuildSketch(Plane(origin=(0, 10, 0), x_dir=(1, 0, 0), z_dir=(0, 1, 0))):
        Polygon((30, -55), (-35, -55), (-35, 38), (-22.5, 38), (-22.5, 46), (-35, 46), (-35, 60), (30, 60), align=None)
    extrude(amount=-CUT_EXTRUDE9_DEPTH, mode=Mode.SUBTRACT)

    # Sketch24 → Cut-Extrude10 (cut)
    with BuildSketch(Plane.XZ):
        with Locations((-40, -65)):
            Circle(SKETCH24_R)
    extrude(amount=-CUT_EXTRUDE10_DEPTH, mode=Mode.SUBTRACT)

    # Sketch25 → Cut-Extrude11 (cut)
    with BuildSketch(Plane.XZ):
        with Locations((-28.75, -42)):
            Rectangle(SKETCH25_W, SKETCH25_H)
    extrude(amount=-CUT_EXTRUDE11_DEPTH, mode=Mode.SUBTRACT)


solid = part.part
